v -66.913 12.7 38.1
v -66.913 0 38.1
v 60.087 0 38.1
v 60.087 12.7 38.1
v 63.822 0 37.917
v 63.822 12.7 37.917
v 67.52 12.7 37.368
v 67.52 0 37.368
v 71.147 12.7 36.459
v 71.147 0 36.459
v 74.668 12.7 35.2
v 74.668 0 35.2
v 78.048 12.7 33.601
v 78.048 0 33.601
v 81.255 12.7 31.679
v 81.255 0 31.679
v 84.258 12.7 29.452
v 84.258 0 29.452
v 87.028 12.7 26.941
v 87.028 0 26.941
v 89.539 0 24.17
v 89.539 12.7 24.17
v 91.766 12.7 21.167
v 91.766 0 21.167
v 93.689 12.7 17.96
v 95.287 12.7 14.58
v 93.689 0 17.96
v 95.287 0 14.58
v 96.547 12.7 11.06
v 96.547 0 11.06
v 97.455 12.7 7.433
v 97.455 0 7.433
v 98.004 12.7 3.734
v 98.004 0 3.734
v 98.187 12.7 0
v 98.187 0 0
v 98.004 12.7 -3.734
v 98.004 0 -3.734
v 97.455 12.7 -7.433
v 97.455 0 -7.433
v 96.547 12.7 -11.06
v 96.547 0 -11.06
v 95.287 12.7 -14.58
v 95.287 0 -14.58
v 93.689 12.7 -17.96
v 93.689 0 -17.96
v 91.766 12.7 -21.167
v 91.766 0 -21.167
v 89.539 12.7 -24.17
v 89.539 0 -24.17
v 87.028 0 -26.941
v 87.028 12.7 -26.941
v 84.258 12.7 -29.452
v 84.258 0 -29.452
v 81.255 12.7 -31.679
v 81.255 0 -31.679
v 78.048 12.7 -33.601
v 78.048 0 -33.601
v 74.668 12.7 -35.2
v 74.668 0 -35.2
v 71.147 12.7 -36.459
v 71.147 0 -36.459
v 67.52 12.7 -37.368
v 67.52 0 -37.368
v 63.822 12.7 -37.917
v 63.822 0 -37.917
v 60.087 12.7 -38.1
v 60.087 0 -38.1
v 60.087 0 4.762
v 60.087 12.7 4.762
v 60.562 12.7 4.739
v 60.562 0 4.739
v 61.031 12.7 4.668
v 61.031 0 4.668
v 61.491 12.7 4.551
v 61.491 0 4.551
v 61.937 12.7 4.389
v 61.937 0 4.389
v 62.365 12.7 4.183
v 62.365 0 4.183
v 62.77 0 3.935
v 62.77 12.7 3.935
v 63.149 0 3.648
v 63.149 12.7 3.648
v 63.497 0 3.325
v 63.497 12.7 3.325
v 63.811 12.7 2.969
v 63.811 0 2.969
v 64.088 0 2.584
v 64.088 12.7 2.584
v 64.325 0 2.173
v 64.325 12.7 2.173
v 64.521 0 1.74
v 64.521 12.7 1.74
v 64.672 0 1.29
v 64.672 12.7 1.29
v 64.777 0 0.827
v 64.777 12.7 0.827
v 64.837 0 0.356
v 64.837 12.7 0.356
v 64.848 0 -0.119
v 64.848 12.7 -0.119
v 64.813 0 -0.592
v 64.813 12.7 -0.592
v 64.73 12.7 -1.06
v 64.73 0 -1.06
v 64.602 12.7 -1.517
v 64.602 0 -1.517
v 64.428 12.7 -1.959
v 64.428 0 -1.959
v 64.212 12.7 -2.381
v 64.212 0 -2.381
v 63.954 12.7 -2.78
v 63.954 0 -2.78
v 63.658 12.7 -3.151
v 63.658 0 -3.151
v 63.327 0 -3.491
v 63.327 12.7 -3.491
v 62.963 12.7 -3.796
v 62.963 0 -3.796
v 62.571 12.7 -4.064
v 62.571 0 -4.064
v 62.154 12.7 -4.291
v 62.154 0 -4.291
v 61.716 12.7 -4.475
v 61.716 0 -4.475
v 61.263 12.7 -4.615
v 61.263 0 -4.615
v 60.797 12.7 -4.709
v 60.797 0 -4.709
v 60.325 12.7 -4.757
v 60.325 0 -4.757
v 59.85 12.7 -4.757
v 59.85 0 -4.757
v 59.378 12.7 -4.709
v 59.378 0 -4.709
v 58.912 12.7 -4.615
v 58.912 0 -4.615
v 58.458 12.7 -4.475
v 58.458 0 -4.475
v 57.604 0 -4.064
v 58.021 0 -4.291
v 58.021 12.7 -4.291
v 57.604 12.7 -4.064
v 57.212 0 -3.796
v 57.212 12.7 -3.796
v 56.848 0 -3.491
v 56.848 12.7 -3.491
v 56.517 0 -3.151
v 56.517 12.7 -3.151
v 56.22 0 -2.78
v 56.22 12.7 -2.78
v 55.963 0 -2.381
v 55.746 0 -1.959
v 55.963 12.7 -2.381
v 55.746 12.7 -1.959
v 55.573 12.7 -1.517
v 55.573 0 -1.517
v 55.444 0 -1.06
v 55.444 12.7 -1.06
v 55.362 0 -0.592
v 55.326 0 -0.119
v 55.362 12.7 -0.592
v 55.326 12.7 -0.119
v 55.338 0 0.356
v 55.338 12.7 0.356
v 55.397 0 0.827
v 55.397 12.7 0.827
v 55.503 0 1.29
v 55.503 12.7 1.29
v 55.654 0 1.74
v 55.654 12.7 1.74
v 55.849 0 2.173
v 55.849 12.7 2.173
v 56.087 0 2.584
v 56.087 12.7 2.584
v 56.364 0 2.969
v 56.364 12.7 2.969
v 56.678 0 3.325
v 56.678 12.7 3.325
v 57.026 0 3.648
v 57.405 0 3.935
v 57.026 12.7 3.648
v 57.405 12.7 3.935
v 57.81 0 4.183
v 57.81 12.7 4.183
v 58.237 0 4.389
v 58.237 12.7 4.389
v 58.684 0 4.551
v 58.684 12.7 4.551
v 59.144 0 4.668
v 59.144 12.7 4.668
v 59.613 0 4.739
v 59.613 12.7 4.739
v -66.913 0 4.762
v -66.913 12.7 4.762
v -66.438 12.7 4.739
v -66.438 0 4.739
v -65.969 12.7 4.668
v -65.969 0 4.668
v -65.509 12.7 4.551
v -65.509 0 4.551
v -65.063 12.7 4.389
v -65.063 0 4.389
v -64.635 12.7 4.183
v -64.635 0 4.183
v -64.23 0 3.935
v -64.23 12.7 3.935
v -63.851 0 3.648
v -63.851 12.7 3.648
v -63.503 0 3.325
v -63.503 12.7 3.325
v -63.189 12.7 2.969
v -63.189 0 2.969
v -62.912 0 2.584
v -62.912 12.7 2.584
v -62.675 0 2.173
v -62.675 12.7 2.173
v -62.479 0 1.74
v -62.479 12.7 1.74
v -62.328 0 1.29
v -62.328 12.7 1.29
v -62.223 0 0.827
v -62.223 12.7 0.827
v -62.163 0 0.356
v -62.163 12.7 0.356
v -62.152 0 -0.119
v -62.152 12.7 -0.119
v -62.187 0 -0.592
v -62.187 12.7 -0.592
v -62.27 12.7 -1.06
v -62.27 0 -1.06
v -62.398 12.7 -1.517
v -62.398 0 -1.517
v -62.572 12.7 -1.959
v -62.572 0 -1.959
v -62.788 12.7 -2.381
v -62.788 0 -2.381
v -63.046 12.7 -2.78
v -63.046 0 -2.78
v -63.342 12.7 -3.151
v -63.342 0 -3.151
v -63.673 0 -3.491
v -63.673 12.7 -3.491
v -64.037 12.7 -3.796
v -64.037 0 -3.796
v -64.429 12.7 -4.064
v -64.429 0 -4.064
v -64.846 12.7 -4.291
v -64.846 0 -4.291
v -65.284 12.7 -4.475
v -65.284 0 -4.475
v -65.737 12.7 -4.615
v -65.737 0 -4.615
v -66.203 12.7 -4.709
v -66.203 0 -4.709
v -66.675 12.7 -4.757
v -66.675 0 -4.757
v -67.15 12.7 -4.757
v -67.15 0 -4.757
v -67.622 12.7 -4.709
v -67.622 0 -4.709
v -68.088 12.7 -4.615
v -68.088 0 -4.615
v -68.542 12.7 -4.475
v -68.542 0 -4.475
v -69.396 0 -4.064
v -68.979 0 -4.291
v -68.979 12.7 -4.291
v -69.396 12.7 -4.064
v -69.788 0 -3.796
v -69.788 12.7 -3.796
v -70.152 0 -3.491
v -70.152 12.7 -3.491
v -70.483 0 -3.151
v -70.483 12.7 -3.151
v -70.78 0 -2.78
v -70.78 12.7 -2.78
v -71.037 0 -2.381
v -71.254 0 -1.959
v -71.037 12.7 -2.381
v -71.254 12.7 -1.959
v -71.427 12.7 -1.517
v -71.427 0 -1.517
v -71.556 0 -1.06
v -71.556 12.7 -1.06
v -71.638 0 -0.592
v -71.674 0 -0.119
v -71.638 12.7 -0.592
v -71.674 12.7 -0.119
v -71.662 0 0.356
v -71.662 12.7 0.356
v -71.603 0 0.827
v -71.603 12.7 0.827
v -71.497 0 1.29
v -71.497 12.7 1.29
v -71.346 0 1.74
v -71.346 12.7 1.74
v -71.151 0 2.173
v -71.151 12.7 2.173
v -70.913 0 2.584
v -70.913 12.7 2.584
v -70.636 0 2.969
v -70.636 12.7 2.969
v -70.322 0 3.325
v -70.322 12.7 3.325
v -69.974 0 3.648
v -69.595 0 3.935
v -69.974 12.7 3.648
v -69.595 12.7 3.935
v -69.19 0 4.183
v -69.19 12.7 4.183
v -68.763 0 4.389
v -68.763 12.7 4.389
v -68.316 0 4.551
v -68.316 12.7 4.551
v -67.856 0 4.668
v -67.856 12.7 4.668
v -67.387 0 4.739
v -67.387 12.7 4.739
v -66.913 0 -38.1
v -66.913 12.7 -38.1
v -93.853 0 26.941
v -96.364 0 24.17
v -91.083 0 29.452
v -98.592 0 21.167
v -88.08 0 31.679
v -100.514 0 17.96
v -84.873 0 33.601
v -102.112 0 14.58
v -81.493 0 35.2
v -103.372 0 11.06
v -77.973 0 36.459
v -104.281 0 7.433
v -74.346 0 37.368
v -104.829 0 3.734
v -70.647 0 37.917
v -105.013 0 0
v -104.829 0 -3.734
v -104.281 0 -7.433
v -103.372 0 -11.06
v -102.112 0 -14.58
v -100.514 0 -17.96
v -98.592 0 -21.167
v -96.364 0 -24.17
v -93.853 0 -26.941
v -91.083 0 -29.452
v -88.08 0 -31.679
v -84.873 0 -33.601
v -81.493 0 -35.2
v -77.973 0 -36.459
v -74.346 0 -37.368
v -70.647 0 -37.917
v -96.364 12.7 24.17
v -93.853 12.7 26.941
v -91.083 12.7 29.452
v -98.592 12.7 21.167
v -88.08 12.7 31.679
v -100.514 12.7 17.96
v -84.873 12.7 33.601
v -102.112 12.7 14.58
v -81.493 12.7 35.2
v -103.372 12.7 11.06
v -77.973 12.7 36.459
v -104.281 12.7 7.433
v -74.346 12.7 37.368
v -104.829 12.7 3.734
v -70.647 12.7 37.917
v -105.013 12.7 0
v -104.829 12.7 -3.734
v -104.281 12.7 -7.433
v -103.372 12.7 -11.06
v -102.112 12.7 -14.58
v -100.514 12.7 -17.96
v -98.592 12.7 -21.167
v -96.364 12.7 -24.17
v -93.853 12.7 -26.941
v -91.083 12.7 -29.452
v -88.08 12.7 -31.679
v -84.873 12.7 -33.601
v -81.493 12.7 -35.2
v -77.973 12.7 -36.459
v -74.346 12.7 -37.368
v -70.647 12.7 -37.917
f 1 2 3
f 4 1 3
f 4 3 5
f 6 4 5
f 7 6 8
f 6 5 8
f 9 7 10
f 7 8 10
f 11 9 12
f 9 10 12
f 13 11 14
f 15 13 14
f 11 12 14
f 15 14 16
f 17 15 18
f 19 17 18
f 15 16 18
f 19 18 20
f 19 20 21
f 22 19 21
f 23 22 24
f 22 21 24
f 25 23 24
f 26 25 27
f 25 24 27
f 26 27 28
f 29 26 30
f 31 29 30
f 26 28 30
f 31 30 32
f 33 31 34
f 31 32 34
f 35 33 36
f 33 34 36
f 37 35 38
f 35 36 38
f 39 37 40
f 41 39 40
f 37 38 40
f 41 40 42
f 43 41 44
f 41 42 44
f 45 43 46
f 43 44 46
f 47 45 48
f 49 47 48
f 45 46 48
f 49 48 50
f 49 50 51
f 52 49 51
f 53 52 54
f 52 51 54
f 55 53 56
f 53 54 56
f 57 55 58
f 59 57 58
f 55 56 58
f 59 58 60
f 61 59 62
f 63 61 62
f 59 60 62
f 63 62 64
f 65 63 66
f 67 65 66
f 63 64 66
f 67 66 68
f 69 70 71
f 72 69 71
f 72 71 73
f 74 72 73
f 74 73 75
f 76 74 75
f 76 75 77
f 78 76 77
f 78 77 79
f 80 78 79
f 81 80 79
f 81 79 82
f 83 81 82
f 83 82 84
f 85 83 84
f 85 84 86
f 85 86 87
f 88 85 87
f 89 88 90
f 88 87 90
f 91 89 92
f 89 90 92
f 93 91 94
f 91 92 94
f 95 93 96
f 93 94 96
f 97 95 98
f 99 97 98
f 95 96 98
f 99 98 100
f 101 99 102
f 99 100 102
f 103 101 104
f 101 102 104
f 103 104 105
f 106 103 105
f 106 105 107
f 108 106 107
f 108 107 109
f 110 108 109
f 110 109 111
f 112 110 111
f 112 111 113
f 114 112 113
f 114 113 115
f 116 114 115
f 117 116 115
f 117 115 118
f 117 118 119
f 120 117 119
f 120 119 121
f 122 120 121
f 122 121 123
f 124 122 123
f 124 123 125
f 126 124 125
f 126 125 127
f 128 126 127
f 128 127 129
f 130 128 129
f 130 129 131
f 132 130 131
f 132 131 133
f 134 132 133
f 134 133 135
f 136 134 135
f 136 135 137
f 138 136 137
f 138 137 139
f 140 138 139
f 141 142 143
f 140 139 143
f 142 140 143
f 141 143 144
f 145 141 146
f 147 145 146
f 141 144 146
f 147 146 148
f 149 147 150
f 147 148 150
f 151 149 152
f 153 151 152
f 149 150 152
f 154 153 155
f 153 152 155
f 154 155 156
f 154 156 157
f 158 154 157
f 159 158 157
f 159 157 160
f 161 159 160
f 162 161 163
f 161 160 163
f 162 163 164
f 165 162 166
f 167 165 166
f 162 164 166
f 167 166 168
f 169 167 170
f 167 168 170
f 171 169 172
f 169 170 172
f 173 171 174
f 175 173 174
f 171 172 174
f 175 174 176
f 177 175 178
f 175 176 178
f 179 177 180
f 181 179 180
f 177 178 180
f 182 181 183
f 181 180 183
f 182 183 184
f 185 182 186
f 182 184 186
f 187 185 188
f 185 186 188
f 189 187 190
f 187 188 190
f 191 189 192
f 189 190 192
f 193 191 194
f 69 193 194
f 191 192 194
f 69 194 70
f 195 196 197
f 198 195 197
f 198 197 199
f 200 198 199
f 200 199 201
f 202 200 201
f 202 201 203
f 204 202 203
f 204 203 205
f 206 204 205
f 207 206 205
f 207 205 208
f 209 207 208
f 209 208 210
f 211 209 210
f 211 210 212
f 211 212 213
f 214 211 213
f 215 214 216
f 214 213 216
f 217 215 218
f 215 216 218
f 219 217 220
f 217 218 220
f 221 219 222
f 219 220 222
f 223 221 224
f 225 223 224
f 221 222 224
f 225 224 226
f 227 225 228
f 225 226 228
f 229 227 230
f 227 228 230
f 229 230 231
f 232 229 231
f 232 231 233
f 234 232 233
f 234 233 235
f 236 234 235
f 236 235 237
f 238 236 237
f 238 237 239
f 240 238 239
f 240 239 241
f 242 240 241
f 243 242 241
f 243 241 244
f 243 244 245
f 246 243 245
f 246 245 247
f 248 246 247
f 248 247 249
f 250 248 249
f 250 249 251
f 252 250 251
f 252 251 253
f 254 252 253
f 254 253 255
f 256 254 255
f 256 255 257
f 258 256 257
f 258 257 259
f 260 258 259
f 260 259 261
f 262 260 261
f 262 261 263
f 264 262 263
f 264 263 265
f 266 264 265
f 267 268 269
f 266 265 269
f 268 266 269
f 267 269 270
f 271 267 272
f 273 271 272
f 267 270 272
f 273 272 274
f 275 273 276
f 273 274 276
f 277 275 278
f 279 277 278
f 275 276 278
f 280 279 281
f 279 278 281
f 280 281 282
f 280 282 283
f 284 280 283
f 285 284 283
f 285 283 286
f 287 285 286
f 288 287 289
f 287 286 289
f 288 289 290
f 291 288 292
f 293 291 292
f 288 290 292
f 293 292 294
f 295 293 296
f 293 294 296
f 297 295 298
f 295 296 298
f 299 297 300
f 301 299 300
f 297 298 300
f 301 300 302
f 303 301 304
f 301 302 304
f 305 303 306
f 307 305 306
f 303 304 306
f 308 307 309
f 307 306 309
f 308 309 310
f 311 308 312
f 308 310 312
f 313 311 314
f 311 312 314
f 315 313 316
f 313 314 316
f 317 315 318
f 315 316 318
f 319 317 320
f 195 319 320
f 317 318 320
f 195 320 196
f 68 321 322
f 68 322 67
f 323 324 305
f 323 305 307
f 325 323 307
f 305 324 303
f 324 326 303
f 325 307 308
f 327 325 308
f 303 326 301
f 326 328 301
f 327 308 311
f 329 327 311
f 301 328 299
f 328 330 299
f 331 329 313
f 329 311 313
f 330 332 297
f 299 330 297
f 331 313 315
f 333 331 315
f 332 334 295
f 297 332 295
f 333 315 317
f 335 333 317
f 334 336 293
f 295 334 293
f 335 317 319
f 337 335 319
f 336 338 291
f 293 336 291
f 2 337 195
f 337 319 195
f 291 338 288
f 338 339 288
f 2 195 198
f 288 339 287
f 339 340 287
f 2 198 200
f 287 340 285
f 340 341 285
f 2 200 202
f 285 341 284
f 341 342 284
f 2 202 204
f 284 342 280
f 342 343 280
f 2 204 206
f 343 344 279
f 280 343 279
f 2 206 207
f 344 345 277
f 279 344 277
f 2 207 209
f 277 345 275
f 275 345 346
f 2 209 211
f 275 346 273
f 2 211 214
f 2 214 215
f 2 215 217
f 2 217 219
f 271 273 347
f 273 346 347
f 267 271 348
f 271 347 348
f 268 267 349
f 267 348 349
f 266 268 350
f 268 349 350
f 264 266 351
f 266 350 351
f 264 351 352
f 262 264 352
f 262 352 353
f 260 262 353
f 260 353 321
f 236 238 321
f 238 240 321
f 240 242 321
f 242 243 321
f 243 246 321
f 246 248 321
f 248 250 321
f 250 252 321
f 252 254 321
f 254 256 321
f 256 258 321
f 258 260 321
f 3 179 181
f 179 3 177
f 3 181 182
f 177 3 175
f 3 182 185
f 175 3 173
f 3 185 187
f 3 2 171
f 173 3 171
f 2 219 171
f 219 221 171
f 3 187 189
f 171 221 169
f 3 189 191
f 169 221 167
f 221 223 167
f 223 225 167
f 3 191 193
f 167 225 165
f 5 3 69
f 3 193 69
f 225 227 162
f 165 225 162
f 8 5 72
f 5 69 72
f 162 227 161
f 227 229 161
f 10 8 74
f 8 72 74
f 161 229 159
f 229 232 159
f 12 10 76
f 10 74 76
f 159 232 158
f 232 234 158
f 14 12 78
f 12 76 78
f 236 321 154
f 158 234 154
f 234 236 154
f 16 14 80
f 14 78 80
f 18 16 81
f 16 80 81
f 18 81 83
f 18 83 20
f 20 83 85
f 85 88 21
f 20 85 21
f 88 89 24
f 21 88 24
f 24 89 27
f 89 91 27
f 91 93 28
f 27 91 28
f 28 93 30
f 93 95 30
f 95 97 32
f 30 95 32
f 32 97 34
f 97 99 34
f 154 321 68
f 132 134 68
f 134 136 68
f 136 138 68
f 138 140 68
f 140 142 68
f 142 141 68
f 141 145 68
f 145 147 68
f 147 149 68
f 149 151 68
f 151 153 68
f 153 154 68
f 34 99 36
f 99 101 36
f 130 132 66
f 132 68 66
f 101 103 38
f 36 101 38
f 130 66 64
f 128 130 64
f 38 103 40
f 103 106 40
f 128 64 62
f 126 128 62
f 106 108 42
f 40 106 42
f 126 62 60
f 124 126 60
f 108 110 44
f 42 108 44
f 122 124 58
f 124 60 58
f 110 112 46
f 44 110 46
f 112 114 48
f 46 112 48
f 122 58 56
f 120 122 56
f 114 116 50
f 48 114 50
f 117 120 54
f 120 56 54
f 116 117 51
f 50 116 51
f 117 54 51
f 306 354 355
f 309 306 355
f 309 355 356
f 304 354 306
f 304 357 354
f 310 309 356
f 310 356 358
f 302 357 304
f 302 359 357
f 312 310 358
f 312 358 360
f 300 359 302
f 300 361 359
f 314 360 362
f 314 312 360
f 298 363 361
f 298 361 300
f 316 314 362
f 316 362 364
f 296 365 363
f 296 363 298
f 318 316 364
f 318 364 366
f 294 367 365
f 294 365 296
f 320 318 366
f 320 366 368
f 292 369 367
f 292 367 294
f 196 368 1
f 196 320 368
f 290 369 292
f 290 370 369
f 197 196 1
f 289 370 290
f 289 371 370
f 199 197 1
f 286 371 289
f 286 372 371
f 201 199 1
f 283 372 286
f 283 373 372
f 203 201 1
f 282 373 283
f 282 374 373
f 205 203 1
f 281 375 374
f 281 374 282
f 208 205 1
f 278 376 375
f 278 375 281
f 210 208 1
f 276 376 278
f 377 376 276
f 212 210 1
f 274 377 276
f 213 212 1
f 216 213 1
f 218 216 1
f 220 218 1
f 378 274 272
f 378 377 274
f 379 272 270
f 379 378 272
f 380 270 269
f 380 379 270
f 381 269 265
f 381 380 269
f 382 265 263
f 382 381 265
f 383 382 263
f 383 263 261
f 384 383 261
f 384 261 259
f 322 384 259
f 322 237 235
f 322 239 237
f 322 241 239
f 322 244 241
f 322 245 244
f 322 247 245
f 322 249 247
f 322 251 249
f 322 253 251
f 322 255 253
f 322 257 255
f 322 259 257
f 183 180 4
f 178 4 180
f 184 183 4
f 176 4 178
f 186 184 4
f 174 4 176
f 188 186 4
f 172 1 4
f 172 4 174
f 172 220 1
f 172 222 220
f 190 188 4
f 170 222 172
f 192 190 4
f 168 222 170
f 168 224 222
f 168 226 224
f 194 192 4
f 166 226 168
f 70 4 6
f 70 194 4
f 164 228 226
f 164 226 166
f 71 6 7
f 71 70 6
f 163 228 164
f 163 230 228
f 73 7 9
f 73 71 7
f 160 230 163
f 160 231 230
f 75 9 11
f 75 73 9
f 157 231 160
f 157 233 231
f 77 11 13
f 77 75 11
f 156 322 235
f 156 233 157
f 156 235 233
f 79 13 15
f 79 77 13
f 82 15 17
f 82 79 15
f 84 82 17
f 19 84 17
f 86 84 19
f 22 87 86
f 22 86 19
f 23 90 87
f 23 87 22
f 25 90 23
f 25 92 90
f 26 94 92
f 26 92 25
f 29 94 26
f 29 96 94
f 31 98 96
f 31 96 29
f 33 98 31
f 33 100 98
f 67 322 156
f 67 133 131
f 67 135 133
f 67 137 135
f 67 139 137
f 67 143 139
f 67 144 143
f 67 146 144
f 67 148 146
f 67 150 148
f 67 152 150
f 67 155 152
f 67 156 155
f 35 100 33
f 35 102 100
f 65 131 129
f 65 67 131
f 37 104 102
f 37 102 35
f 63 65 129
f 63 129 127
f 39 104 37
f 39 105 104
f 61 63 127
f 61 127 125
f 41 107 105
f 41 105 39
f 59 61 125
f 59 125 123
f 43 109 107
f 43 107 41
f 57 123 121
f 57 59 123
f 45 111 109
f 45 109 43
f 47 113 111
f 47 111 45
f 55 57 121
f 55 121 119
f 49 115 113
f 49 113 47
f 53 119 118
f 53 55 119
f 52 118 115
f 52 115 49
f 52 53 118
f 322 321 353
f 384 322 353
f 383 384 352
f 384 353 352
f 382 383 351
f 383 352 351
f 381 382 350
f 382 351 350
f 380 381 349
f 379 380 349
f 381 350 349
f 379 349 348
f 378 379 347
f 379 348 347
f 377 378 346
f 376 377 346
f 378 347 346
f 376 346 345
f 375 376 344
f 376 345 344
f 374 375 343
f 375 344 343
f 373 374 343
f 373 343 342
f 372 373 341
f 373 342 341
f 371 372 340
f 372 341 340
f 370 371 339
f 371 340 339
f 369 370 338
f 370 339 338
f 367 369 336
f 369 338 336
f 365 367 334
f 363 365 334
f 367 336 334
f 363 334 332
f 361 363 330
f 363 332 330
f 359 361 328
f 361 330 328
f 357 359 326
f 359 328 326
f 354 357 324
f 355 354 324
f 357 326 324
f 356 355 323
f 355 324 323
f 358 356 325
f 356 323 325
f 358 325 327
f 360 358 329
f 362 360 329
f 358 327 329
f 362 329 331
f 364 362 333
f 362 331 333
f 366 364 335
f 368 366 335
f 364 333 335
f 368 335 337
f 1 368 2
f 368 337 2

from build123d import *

# Parameters (mm, degrees)
SKETCH1_R           = 38.1
SKETCH1_W           = 127
SKETCH1_H           = 76.2
BOSS_EXTRUDE1_DEPTH = 12.7
SKETCH2_R           = 4.7625
CUT_EXTRUDE2_DEPTH  = 113.430244289


with BuildPart() as part:
    # Sketch1 → Boss-Extrude1 (new body)
    with BuildSketch(Plane(origin=(0, 0, 0), x_dir=(1, 0, 0), z_dir=(0, 1, 0))):
        with Locations((-66.912665097, 0)):
            Circle(SKETCH1_R)
        with Locations((60.087334903, 0)):
            Circle(SKETCH1_R)
        with Locations((-3.412665097, 0)):
            Rectangle(SKETCH1_W, SKETCH1_H)
    extrude(amount=BOSS_EXTRUDE1_DEPTH)

    # Sketch2 → Cut-Extrude2 (cut, through all)
    with BuildSketch(Plane(origin=(0, 12.7, 0), x_dir=(1, 0, 0), z_dir=(0, 1, 0))):
        with Locations(Location((-66.912665097, 0, 0), (0, 0, 270))):
            Circle(SKETCH2_R)
        with Locations(Location((60.087334903, 0, 0), (0, 0, 270))):
            Circle(SKETCH2_R)
    extrude(amount=-CUT_EXTRUDE2_DEPTH, mode=Mode.SUBTRACT)


solid = part.part
